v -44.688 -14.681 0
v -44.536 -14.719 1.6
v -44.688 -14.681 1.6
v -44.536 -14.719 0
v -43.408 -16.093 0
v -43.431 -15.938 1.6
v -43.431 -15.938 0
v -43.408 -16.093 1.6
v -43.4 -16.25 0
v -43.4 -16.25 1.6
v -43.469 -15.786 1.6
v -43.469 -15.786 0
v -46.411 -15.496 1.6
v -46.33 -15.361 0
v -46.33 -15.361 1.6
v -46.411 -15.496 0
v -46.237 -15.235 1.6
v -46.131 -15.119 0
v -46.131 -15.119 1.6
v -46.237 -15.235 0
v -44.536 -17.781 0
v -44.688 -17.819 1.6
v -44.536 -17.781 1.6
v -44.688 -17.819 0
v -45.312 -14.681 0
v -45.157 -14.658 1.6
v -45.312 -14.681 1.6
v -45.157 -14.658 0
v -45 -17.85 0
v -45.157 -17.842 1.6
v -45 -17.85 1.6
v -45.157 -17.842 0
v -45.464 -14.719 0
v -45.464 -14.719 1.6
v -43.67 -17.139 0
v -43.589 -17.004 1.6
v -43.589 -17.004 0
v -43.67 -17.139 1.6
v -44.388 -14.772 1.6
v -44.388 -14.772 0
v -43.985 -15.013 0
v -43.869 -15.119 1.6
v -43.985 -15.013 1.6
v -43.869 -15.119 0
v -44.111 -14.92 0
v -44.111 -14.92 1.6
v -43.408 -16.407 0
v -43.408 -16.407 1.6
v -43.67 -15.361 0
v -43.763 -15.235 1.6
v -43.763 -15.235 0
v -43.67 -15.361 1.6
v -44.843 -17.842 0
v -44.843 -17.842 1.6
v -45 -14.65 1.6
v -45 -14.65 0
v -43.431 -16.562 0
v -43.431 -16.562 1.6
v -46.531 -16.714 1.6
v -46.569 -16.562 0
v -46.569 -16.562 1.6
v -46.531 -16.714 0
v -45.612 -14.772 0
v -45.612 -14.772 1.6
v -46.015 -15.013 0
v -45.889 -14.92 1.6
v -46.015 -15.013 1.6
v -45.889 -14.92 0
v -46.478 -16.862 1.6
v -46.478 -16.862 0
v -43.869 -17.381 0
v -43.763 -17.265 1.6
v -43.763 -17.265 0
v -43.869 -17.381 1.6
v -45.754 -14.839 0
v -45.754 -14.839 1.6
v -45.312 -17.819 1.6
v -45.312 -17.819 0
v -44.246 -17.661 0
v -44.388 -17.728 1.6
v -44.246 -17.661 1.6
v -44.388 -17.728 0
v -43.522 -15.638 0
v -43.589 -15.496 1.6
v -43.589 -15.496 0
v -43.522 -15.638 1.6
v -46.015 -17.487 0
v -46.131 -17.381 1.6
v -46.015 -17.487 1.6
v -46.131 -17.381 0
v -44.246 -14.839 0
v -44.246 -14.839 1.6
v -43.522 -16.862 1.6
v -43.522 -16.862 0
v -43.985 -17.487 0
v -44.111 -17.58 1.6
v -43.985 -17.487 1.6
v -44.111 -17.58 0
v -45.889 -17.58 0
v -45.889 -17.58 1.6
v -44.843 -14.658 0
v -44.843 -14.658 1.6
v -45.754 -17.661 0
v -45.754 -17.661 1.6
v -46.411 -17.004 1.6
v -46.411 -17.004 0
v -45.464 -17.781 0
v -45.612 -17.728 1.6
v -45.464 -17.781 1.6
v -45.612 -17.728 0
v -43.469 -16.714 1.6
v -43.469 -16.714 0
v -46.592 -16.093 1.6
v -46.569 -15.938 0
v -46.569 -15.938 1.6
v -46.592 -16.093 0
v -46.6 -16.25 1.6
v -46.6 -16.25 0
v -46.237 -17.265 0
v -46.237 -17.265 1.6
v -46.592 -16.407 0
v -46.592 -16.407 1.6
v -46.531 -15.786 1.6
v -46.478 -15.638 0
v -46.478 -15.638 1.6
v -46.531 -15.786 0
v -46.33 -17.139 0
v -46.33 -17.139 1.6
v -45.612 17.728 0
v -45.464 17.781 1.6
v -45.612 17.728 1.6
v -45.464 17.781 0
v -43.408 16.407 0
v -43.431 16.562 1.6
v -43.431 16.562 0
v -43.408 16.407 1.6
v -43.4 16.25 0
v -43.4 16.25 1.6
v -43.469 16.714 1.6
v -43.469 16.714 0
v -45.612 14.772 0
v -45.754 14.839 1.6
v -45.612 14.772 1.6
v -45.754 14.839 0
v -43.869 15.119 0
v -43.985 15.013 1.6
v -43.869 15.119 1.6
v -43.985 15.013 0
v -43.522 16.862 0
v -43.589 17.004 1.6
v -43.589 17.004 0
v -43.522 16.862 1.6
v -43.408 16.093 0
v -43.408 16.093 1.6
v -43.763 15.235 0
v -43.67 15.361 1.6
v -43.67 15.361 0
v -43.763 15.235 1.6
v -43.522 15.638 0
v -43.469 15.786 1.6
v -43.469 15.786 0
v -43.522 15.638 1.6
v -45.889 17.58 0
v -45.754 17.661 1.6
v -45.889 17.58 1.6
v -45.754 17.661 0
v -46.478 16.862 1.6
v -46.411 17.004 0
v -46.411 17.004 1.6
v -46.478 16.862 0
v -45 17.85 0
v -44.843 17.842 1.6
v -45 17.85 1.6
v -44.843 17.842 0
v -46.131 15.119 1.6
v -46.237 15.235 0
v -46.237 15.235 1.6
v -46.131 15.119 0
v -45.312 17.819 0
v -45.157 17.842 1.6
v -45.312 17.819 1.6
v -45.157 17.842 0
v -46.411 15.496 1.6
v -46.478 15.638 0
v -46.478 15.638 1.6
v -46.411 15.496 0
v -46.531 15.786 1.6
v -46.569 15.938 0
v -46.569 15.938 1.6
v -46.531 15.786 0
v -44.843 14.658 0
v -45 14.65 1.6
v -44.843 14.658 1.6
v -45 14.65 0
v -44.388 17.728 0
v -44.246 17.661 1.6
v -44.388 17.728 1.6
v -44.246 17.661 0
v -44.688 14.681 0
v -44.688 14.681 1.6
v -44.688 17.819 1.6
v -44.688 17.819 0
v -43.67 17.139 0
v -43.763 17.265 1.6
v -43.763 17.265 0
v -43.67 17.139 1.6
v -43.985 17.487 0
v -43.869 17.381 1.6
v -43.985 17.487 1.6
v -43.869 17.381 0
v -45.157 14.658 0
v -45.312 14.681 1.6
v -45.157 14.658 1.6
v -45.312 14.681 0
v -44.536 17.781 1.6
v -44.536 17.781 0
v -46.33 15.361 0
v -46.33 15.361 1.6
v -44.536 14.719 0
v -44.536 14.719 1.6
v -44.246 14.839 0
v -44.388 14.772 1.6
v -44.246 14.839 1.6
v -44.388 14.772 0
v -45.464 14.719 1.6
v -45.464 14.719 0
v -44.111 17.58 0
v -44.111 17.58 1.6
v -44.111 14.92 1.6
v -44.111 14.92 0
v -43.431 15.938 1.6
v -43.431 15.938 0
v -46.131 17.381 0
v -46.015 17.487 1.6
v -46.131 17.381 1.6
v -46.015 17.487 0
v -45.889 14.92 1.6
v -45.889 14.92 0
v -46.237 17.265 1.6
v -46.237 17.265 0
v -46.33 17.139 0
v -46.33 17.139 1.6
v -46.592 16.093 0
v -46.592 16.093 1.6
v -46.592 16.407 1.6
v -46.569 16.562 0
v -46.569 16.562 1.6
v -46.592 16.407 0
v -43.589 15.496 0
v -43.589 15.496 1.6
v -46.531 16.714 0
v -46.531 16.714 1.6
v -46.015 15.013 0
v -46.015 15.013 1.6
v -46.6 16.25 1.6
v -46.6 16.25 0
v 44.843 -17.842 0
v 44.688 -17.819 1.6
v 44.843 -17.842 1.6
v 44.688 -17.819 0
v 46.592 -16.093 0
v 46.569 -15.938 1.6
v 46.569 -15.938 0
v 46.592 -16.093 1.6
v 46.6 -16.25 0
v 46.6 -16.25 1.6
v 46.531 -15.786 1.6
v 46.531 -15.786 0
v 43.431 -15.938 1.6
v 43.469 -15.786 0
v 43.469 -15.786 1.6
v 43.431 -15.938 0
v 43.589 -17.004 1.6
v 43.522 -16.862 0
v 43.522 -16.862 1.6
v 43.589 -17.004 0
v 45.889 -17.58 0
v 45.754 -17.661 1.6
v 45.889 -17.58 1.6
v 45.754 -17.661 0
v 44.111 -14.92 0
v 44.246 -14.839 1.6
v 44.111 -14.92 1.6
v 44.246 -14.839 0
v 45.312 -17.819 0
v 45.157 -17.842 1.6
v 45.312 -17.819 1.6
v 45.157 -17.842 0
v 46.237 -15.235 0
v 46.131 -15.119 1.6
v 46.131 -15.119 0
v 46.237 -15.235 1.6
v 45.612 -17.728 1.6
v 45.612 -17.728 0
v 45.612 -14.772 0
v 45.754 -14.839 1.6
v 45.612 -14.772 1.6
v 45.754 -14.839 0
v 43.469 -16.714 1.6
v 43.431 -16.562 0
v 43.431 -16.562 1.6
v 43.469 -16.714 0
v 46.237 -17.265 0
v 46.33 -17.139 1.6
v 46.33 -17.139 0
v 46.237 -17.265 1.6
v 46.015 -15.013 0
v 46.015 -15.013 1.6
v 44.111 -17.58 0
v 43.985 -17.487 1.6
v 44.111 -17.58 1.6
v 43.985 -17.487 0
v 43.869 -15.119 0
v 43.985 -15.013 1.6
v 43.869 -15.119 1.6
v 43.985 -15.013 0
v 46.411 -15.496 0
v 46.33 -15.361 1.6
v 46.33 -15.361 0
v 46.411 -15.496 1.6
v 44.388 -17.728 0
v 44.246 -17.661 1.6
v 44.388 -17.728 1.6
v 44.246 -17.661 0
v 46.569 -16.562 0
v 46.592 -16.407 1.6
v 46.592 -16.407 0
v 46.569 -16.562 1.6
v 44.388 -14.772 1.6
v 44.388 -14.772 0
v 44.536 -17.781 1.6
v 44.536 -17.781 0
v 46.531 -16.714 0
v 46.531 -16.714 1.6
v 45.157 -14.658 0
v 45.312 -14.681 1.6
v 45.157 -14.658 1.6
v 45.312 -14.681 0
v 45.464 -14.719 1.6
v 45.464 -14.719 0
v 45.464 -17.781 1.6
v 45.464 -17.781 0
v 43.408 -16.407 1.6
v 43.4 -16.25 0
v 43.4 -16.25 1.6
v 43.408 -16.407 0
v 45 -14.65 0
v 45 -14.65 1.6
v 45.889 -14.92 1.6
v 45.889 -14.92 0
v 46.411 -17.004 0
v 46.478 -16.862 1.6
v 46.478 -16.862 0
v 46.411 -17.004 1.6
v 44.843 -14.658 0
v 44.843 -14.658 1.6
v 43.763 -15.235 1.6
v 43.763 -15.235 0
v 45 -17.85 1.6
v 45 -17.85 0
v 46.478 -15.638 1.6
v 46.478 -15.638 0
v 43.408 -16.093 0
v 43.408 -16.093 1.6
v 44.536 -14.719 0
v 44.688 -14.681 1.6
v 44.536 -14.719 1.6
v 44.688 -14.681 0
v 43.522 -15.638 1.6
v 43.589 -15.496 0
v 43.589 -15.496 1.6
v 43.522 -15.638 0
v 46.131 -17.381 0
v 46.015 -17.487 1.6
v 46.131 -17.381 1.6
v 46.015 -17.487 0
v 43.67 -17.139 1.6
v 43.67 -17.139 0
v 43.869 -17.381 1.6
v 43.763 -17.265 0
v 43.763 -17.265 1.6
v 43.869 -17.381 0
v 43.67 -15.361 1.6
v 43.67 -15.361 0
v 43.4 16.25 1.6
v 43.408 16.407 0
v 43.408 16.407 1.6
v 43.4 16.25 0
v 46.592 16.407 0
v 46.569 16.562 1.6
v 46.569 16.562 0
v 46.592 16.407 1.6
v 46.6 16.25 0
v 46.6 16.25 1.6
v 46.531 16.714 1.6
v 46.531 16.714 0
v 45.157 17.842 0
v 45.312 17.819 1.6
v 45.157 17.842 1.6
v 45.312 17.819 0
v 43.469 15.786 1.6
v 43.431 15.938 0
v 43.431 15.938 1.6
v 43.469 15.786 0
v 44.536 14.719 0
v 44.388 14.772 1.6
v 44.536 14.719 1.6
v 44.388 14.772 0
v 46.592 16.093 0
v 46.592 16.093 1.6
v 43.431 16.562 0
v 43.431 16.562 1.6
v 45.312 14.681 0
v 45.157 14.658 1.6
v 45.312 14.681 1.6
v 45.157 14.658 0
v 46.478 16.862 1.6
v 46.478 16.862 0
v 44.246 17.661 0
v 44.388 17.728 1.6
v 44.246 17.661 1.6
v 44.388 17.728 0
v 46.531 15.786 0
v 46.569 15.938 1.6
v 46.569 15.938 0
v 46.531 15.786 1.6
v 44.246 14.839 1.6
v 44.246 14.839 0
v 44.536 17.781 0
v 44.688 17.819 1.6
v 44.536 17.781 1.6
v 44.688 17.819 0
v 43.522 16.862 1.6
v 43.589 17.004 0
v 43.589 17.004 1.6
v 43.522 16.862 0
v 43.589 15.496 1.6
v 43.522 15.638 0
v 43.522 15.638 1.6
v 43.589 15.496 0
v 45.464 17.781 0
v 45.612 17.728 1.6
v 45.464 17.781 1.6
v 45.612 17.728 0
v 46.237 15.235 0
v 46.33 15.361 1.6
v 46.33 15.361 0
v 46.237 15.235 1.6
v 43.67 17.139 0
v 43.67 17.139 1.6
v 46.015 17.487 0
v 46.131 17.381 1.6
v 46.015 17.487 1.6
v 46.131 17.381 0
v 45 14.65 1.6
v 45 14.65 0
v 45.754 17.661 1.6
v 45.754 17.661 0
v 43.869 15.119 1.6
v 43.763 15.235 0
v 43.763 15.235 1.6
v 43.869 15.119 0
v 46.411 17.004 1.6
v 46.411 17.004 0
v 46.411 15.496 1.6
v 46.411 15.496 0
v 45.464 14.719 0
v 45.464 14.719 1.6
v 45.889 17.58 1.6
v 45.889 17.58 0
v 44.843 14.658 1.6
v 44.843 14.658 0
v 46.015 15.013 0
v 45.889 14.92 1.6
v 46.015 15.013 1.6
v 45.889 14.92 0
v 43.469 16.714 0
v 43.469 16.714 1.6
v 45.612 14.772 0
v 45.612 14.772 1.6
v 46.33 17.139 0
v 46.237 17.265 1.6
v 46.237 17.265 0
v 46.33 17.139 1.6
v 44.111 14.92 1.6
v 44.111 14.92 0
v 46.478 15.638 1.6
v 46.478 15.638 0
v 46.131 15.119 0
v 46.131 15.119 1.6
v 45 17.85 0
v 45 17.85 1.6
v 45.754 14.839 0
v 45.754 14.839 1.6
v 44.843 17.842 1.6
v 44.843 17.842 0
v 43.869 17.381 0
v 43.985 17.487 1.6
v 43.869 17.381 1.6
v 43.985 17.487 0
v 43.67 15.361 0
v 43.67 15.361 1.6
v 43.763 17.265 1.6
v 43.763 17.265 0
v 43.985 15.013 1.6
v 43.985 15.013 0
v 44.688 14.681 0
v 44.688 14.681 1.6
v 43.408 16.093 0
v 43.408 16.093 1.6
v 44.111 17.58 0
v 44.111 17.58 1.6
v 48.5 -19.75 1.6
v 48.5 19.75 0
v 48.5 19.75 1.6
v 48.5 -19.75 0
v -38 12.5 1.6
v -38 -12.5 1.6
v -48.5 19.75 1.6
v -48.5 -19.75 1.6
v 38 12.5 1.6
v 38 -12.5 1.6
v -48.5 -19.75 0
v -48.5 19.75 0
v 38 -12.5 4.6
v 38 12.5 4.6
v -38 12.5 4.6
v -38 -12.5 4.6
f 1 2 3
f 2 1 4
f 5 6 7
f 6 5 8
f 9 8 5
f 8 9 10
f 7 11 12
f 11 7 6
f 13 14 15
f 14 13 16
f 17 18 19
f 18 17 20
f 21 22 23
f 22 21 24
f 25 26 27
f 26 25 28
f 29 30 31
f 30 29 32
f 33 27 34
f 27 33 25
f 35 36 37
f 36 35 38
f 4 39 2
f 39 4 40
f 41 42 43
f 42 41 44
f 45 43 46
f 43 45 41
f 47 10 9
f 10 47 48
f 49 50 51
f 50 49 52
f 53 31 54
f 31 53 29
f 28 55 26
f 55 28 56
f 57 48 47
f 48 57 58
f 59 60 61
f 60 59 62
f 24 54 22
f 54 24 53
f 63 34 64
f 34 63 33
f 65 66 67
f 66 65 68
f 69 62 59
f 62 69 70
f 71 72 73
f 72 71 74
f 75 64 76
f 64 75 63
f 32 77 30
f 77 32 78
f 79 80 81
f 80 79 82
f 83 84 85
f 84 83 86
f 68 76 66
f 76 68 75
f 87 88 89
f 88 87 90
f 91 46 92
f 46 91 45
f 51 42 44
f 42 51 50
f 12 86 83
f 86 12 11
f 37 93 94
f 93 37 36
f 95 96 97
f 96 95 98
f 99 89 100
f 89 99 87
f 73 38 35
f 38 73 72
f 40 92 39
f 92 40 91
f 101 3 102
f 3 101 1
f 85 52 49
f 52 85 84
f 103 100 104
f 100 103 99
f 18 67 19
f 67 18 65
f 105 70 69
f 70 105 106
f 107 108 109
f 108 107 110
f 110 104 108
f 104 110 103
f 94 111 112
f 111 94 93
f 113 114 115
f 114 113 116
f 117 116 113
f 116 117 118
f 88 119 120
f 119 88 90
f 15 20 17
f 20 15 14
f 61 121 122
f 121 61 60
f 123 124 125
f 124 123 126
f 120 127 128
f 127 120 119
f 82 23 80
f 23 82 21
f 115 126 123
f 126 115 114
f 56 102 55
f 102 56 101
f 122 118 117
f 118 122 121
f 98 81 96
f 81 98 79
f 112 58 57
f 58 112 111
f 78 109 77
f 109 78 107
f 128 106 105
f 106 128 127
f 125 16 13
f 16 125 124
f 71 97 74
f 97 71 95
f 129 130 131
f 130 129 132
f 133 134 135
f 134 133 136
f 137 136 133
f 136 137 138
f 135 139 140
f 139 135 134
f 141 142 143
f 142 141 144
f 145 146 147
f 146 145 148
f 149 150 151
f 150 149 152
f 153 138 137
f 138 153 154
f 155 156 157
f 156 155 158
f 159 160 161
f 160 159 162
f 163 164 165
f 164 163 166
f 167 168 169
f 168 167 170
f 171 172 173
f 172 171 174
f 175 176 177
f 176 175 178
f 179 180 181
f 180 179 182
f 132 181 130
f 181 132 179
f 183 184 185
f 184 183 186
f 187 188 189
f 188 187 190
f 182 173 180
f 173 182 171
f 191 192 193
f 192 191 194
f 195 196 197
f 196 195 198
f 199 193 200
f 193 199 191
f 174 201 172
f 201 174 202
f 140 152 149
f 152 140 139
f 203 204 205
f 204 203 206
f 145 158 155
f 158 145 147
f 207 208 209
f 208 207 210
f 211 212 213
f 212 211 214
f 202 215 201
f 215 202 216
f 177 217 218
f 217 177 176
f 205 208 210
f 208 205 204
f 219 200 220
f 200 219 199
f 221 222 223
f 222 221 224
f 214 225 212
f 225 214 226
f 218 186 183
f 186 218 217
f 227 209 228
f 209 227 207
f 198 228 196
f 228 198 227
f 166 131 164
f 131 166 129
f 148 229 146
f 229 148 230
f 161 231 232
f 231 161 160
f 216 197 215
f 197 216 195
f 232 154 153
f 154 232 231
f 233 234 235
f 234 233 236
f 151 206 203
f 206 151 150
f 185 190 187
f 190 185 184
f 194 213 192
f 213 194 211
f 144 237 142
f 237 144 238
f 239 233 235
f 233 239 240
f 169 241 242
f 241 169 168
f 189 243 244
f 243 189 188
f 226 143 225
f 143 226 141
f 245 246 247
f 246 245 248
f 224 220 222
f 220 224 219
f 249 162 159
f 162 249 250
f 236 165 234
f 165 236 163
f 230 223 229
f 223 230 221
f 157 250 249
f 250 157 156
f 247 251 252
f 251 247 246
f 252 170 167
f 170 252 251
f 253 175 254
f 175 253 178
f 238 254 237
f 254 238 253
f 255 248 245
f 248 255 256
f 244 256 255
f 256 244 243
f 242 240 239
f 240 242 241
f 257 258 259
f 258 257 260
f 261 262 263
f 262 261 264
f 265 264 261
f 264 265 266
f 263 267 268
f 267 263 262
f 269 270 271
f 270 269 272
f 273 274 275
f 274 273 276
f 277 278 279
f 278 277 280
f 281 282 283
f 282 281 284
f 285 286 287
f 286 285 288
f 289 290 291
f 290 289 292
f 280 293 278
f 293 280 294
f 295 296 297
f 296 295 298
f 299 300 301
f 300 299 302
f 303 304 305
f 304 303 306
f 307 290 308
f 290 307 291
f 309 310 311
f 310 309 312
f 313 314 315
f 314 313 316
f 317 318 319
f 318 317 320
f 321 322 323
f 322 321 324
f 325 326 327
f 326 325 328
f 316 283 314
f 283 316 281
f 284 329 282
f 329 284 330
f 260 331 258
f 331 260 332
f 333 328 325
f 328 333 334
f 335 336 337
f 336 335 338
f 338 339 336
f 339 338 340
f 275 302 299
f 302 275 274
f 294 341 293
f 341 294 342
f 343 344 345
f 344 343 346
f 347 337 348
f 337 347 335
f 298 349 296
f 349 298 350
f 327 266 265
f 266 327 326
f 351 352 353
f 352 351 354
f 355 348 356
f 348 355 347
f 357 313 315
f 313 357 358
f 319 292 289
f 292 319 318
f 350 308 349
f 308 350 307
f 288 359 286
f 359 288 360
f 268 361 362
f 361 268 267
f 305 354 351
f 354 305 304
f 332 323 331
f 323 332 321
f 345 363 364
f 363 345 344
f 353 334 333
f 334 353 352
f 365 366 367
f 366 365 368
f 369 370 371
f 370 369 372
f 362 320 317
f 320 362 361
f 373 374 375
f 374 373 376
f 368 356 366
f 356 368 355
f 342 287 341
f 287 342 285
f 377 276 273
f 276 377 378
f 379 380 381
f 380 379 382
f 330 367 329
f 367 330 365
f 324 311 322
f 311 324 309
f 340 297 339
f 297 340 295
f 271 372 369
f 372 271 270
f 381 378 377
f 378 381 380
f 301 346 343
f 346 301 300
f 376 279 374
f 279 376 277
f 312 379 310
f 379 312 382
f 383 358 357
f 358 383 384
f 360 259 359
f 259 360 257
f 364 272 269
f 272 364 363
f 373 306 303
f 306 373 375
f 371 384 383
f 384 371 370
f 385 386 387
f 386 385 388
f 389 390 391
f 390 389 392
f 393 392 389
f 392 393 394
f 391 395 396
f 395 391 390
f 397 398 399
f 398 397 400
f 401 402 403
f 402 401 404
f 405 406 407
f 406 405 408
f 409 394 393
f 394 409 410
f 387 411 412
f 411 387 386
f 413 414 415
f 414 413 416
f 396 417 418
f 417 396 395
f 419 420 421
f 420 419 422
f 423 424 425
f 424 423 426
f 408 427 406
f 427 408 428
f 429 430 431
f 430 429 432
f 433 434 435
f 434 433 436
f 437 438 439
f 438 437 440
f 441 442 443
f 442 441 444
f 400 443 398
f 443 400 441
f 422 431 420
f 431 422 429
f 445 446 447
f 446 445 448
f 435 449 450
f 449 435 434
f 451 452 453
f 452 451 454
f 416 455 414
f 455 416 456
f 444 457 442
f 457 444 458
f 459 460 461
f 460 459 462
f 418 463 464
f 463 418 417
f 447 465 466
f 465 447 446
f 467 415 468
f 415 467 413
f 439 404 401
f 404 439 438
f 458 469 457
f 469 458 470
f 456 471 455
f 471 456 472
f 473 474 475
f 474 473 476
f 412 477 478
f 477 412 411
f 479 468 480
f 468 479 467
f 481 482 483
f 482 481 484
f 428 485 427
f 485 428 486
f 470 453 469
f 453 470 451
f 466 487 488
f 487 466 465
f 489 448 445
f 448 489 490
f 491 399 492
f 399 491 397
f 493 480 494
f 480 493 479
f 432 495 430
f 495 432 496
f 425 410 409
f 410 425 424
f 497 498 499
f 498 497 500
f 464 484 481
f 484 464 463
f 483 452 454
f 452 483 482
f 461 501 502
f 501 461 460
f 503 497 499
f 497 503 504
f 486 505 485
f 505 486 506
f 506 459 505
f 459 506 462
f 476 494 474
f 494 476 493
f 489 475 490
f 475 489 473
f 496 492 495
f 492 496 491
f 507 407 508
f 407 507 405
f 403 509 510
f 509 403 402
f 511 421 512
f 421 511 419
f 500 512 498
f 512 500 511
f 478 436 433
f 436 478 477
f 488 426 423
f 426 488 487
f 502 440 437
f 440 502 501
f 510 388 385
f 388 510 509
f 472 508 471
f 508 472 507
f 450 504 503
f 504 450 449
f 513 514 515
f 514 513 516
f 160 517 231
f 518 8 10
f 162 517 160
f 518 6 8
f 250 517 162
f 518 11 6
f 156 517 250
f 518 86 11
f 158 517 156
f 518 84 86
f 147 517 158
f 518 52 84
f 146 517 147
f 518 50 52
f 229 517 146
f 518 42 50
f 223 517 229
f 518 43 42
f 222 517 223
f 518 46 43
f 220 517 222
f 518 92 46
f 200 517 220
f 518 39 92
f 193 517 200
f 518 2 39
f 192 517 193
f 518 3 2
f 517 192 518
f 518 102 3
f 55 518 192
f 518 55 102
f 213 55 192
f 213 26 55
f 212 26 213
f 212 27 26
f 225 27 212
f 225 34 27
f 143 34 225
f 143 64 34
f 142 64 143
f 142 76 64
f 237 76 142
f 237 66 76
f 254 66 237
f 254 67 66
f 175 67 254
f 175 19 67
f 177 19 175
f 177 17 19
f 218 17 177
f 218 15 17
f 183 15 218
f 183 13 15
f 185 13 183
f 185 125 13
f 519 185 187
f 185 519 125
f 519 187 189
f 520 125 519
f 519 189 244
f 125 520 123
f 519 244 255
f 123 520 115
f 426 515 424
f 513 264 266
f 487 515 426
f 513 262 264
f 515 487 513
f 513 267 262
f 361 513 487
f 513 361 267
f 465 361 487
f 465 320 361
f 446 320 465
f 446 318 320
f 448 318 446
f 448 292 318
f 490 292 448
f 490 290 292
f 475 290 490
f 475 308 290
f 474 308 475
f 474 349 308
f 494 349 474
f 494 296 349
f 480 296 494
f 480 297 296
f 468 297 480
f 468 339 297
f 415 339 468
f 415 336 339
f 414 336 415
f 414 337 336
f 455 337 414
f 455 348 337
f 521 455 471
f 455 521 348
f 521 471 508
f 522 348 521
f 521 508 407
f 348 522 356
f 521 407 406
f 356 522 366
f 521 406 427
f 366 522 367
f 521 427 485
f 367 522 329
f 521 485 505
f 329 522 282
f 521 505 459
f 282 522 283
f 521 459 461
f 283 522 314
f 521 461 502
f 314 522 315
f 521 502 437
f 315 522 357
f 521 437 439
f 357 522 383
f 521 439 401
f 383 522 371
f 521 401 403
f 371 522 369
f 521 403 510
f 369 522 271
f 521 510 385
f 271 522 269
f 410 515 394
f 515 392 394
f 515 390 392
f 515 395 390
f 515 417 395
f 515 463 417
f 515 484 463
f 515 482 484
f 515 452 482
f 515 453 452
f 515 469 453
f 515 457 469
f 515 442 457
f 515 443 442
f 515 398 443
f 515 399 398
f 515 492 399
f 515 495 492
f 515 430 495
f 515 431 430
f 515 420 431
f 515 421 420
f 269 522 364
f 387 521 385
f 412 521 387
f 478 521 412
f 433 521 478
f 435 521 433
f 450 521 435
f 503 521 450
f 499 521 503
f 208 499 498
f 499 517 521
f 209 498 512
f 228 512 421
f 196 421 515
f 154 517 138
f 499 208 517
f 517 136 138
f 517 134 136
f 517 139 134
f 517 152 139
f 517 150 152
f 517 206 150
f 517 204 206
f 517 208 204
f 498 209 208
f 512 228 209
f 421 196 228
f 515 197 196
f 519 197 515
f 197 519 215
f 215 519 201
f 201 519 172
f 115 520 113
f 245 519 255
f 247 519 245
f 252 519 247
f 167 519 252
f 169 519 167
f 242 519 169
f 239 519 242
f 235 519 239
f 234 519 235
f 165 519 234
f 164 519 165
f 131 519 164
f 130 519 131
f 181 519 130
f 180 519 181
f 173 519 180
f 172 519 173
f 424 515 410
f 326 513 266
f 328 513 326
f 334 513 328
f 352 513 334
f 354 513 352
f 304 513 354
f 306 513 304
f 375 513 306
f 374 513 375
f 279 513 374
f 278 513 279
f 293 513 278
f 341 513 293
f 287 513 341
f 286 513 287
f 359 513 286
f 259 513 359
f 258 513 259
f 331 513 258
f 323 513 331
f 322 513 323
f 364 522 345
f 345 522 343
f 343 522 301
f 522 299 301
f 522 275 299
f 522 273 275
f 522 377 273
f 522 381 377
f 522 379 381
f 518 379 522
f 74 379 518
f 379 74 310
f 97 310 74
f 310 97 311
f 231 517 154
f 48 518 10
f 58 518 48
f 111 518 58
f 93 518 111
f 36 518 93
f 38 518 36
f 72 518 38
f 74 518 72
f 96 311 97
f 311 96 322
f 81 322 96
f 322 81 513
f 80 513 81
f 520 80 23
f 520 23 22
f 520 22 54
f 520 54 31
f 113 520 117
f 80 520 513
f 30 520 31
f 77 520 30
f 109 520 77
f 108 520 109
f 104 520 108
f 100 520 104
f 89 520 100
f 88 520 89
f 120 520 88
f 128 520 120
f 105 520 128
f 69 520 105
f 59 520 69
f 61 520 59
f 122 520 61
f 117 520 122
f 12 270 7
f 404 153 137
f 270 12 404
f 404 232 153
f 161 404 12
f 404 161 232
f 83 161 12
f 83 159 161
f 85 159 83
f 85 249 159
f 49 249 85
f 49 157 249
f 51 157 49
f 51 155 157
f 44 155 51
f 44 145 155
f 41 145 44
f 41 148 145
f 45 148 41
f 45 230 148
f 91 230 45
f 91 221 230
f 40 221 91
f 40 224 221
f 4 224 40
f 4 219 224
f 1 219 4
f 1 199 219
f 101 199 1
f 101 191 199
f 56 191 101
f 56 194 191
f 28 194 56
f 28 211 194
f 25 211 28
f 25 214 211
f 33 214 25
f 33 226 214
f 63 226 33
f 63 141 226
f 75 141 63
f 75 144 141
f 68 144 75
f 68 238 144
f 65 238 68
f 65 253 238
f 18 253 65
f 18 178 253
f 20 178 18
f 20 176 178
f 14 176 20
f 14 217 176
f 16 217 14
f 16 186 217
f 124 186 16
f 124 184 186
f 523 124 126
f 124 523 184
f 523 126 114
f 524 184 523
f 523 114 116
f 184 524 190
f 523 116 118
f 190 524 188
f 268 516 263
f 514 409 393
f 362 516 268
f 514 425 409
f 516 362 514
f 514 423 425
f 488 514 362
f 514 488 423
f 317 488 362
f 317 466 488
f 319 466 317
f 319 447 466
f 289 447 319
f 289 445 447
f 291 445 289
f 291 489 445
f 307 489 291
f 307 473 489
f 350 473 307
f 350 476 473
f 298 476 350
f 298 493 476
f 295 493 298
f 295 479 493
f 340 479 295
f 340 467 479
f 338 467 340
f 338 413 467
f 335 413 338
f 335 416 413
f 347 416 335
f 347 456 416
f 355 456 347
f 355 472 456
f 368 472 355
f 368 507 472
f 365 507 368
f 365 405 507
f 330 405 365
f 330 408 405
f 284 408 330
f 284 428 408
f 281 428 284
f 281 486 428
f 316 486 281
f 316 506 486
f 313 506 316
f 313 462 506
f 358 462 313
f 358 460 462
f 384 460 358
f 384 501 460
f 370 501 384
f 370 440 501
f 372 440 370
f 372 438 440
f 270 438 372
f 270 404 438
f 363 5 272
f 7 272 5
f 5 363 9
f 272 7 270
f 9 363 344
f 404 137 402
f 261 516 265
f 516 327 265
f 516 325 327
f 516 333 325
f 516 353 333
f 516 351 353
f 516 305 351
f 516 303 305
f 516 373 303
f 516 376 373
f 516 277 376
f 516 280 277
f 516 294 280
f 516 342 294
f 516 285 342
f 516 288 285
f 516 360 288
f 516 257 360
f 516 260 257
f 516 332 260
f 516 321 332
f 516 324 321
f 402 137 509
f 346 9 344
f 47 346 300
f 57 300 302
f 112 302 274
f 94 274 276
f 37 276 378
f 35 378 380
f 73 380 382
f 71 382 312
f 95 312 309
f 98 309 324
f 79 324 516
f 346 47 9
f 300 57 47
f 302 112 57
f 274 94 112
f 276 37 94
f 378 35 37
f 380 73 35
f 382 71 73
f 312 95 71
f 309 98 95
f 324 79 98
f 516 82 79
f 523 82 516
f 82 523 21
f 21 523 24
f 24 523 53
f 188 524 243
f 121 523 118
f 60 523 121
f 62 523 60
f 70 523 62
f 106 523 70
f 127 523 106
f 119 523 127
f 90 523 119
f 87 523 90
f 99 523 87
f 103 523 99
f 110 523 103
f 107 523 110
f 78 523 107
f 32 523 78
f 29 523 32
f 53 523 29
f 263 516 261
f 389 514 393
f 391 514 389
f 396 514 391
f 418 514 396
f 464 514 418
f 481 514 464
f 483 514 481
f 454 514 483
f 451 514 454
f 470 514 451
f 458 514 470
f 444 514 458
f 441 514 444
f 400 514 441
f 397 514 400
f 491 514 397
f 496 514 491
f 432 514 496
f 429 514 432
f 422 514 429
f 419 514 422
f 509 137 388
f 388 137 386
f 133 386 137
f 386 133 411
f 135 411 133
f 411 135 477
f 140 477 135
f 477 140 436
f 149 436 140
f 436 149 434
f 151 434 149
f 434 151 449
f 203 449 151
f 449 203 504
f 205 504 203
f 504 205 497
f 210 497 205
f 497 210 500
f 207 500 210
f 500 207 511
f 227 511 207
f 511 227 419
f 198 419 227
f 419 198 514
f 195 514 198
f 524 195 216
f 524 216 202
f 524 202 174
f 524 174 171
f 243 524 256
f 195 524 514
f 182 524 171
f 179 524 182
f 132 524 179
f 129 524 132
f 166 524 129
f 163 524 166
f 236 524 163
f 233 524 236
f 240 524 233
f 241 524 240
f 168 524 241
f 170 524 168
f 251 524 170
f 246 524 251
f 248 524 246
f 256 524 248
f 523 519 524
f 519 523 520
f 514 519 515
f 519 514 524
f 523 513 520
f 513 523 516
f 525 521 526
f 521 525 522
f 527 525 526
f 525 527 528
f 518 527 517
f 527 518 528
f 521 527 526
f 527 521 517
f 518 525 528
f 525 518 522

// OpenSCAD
$fn=64;

// LCD 2004A display module (approx) 97.0mm x 39.5mm
// Simple renderable model: PCB + bezel + viewing window + 4 mounting holes

module lcd2004a_module(
    pcb_x=97.0,
    pcb_y=39.5,
    pcb_t=1.6,
    hole_d=3.2,
    hole_edge_x=3.5,   // distance from left/right edge to hole center
    hole_edge_y=3.5,   // distance from bottom/top edge to hole center
    bezel_x=76.0,
    bezel_y=25.0,
    bezel_t=3.0,
    window_x=70.0,
    window_y=18.0,
    window_depth=1.6
){
    module pcb(){
        difference(){
            color([0.05,0.35,0.12]) translate([-pcb_x/2,-pcb_y/2,0]) cube([pcb_x,pcb_y,pcb_t], center=false);
            for (sx=[-1,1], sy=[-1,1]){
                translate([sx*(pcb_x/2 - hole_edge_x), sy*(pcb_y/2 - hole_edge_y), -0.1])
                    cylinder(d=hole_d, h=pcb_t+0.2);
            }
        }
    }

    module bezel(){
        // Raised bezel centered on PCB
        difference(){
            color([0.15,0.15,0.15])
                translate([-bezel_x/2,-bezel_y/2,pcb_t])
                    cube([bezel_x,bezel_y,bezel_t], center=false);

            // Viewing window cutout
            translate([-window_x/2,-window_y/2,pcb_t + bezel_t - window_depth])
                cube([window_x,window_y,window_depth+0.2], center=false);
        }

        // Dark "glass" inset
        color([0.02,0.08,0.10,0.85])
            translate([-window_x/2,-window_y/2,pcb_t + bezel_t - window_depth])
                cube([window_x,window_y,window_depth], center=false);
    }

    pcb();
    bezel();
}

lcd2004a_module();
